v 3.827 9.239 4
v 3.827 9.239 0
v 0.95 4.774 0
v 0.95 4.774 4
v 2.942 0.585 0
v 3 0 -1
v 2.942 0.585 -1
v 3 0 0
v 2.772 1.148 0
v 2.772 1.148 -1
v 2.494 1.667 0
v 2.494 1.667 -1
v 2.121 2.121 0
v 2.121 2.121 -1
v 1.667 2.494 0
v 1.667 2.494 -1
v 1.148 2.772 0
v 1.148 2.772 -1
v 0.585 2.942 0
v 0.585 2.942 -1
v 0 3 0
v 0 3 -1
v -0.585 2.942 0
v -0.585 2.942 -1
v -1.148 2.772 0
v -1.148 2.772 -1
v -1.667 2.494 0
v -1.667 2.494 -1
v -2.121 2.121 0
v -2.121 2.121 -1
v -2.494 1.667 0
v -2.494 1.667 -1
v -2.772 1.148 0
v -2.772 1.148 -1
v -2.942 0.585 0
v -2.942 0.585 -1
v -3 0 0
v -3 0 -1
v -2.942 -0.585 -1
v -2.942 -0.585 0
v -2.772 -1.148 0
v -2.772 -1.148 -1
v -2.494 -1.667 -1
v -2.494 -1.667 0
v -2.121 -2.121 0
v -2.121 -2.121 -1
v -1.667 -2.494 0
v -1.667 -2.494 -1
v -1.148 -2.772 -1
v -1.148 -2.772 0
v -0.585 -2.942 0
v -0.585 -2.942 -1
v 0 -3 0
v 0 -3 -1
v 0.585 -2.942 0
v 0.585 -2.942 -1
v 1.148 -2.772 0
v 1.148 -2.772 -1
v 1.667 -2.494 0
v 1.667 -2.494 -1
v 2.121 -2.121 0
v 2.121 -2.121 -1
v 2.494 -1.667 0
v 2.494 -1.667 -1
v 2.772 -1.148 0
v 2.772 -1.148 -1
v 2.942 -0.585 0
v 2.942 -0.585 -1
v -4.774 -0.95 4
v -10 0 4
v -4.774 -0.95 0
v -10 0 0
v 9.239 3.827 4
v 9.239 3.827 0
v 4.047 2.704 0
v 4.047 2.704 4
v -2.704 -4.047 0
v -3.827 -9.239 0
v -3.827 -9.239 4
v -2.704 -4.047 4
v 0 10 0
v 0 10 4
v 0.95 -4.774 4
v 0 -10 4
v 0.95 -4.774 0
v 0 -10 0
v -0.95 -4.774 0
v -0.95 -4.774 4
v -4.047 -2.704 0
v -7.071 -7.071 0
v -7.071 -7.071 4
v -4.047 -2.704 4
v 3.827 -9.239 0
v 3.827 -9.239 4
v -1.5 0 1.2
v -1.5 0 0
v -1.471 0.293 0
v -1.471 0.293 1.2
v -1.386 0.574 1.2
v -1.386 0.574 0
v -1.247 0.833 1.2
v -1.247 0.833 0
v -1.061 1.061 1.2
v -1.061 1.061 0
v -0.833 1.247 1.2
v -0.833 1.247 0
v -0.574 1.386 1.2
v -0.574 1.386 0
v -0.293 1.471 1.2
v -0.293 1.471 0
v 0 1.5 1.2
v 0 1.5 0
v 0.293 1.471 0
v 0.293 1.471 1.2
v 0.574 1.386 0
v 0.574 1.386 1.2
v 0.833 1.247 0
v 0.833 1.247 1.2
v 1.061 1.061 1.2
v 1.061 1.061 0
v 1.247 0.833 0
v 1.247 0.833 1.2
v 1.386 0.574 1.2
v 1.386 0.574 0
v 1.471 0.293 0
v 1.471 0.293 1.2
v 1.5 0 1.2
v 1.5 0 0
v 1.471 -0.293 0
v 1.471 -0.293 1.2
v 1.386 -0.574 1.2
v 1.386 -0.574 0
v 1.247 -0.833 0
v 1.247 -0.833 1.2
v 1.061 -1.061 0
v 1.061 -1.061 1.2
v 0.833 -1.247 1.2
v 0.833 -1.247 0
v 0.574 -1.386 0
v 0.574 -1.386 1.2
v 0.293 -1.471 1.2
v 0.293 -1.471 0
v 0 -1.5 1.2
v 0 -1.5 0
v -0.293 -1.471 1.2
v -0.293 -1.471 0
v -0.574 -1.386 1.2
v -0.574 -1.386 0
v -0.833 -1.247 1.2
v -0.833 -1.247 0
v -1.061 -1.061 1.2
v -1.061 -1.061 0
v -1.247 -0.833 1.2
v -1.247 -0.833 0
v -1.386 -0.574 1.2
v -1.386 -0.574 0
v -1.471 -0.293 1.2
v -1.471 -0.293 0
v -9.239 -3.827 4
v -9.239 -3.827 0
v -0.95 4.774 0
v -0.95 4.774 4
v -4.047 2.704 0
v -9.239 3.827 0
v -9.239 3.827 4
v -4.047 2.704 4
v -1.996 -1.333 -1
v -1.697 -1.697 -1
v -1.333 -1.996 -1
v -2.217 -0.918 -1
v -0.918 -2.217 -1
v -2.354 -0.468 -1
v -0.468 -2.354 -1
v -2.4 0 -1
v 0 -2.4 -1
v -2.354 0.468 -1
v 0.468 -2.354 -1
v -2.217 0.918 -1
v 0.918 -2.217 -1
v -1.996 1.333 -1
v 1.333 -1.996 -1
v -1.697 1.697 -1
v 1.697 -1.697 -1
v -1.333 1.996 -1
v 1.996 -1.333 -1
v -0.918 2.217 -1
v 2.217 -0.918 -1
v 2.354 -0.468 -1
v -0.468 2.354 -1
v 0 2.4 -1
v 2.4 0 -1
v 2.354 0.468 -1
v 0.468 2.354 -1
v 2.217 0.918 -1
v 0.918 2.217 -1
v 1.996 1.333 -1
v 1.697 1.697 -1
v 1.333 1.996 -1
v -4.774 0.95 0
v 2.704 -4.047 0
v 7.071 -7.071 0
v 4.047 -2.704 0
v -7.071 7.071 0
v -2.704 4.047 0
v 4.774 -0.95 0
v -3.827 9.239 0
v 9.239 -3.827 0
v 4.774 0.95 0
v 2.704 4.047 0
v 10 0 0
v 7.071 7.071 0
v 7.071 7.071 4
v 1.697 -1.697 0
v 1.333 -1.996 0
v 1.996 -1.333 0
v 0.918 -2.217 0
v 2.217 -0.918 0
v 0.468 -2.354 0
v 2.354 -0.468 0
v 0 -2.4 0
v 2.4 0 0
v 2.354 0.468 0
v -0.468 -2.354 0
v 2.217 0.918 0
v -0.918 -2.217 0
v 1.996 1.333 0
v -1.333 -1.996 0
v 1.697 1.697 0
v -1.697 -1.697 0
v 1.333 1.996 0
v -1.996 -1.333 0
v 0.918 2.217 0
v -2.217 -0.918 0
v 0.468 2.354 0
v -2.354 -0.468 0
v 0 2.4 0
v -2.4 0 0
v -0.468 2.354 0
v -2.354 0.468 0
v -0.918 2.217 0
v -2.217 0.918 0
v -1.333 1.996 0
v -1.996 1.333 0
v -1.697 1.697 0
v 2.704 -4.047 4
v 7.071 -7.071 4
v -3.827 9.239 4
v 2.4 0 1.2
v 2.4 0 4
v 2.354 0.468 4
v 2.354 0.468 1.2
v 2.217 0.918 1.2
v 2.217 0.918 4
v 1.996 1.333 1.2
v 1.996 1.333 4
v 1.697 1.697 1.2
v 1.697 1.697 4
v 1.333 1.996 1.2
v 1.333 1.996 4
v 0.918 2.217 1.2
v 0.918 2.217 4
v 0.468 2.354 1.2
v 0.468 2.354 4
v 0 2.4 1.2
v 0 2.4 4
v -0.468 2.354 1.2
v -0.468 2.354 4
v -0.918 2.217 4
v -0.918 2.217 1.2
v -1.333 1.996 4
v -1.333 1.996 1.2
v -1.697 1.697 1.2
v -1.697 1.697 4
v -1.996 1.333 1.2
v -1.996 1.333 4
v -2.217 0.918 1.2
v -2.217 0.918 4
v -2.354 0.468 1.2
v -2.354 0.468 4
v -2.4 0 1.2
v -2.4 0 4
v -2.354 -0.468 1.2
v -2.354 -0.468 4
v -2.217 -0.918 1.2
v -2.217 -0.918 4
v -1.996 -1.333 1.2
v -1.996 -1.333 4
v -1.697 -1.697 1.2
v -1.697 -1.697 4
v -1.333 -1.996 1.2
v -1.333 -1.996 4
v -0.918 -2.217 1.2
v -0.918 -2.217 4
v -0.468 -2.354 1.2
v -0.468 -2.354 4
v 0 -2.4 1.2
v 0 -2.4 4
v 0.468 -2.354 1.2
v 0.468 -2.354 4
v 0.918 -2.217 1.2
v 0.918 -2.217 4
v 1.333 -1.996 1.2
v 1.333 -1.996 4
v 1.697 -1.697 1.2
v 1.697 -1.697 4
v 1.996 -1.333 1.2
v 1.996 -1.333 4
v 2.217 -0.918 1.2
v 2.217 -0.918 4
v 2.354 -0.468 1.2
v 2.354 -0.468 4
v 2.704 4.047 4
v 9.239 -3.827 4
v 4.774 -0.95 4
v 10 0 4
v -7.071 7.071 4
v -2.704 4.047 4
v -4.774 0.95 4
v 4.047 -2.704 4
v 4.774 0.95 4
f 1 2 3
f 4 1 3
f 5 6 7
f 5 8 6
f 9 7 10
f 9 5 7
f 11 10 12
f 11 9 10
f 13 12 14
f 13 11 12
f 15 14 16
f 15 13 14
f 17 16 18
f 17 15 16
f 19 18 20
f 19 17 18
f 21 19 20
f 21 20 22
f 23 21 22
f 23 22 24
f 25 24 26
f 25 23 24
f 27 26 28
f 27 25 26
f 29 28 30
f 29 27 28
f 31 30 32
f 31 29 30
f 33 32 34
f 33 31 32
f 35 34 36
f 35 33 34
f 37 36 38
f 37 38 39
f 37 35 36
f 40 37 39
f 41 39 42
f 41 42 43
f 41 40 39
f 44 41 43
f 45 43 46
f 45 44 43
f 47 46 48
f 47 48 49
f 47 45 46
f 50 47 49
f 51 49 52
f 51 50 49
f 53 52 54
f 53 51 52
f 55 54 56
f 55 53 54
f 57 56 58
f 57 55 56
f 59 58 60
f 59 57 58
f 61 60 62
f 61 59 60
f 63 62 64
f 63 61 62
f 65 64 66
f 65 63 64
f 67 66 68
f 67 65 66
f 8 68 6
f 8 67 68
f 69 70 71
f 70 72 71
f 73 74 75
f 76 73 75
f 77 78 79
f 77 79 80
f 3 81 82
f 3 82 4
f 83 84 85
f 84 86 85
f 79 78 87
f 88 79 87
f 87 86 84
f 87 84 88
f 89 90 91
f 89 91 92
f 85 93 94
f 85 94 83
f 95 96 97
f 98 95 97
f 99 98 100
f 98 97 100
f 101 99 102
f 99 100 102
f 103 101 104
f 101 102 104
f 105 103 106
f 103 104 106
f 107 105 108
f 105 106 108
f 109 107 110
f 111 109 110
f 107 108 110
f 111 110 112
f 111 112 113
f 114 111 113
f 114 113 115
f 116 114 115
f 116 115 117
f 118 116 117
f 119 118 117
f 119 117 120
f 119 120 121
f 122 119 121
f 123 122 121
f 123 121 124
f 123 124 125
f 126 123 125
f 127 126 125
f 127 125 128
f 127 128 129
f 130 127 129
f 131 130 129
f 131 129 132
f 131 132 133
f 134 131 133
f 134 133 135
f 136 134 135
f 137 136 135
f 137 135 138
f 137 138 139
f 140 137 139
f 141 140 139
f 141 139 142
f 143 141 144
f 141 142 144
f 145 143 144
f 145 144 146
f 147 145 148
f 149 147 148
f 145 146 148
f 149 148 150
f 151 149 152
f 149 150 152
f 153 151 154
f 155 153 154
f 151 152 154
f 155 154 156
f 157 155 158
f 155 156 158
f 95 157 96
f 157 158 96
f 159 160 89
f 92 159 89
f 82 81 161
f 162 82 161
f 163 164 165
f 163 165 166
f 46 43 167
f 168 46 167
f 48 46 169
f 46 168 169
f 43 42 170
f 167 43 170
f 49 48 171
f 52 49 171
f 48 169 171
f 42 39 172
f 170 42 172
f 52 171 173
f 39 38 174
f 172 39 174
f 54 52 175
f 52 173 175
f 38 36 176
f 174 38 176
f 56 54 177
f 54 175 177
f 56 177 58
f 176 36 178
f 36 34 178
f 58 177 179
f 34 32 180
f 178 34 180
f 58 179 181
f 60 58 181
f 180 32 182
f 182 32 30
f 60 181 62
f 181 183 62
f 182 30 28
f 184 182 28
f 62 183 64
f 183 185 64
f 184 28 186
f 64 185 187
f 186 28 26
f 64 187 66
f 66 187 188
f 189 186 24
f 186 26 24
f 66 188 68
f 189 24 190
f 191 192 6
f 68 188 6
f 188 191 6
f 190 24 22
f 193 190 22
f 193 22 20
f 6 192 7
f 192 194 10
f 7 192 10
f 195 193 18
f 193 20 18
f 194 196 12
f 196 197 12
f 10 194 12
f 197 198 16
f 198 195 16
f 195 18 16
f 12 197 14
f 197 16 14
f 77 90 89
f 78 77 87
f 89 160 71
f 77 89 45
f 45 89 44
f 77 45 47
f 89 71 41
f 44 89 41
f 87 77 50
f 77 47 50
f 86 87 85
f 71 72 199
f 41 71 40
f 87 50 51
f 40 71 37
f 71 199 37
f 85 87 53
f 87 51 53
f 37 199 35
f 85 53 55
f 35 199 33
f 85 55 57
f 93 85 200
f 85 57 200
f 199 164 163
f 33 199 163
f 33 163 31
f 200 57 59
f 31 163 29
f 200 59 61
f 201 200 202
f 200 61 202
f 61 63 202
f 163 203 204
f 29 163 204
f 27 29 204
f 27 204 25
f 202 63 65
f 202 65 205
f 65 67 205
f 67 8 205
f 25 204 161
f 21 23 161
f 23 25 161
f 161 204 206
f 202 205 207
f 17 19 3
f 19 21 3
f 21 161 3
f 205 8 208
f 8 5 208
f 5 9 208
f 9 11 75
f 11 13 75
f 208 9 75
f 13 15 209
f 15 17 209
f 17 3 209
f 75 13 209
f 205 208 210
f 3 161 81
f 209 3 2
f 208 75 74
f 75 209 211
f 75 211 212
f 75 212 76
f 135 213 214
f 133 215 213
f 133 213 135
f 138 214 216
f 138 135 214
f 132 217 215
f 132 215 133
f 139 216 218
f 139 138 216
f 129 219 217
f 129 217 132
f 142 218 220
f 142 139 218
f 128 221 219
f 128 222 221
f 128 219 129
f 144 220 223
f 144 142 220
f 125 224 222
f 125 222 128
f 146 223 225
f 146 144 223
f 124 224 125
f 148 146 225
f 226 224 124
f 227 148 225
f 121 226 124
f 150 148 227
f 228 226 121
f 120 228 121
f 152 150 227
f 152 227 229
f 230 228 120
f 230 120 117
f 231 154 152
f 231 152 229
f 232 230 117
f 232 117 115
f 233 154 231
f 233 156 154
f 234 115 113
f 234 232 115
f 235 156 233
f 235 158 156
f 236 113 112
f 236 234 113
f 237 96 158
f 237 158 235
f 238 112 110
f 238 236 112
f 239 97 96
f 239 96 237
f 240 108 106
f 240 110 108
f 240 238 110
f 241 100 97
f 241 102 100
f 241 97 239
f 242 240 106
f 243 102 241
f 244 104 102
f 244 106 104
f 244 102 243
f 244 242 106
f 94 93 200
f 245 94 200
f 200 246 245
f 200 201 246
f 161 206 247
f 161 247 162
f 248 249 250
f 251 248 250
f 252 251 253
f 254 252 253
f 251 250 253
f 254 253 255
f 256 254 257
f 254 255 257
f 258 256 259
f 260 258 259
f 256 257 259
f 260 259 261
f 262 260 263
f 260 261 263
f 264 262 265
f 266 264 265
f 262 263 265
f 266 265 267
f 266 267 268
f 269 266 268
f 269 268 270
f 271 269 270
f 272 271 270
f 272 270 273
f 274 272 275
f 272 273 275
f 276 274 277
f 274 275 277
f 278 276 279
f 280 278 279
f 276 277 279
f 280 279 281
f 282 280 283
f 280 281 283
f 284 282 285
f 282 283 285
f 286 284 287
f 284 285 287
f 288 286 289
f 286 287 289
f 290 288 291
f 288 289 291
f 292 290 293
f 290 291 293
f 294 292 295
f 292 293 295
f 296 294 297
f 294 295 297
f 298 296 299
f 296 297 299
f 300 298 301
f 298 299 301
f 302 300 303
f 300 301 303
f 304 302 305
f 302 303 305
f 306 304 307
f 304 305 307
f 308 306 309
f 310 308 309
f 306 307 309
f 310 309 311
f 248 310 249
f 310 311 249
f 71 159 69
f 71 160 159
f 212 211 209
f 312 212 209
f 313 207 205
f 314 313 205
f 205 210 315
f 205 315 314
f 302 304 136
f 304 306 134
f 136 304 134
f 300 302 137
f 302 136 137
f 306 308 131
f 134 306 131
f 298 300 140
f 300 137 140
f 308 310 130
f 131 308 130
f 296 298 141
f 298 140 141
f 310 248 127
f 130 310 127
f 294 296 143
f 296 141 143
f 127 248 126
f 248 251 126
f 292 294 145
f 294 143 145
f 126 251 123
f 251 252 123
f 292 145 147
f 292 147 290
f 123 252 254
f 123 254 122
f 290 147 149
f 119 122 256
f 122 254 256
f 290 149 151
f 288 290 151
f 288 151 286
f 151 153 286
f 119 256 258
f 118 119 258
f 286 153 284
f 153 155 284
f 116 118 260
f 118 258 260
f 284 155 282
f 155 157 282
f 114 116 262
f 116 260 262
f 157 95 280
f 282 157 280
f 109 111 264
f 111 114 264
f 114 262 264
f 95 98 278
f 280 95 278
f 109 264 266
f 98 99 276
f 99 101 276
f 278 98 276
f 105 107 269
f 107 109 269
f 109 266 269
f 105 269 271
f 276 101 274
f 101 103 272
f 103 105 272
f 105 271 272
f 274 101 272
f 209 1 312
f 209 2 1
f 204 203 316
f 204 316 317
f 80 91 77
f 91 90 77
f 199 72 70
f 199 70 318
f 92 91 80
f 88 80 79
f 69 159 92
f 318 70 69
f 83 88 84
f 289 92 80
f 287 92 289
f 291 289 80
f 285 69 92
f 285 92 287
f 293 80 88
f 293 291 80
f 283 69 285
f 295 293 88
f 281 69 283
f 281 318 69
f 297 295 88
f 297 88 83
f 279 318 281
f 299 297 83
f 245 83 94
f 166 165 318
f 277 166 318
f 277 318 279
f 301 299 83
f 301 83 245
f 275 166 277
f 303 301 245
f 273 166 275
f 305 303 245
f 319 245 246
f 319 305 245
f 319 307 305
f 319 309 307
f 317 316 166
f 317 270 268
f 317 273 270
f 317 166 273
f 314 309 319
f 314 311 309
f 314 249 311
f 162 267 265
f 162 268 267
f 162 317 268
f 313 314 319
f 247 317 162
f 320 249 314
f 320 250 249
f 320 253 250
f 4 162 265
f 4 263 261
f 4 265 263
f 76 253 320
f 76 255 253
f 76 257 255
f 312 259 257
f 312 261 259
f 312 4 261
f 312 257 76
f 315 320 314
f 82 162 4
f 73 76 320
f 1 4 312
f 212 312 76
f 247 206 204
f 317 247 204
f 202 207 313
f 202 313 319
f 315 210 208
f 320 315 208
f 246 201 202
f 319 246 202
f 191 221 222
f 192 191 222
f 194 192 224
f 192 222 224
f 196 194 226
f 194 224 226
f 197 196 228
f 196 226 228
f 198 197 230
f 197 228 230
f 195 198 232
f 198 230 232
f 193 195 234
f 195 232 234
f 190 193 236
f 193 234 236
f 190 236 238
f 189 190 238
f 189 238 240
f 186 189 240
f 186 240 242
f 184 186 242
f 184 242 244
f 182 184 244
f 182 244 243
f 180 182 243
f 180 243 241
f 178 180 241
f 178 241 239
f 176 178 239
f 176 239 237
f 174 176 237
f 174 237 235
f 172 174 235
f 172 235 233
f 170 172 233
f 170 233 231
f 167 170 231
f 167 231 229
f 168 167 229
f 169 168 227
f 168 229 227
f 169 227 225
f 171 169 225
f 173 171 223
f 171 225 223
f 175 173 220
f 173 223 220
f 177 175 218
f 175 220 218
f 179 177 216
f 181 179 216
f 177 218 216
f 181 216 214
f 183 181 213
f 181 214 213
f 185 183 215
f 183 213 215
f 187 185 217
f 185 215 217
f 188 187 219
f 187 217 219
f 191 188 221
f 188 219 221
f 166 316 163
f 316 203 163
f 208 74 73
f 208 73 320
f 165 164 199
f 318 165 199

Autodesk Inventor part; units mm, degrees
ref_plane "YZ Plane" through (0, 0, 0) normal (1, 0, 0) x (0, 1, 0)
ref_plane "XZ Plane" through (0, 0, 0) normal (0, 1, 0) x (-1, 0, 0)
ref_plane "XY Plane" through (0, 0, 0) normal (0, 0, 1) x (1, 0, 0)
sketch "Szkic1" plane through (0, 0, 0) normal (0, 0, 1) x (1, 0, 0)
  circle A0 centre (0, 0) radius 2.25
  circle A1 centre (0, 0) radius 3
  dimension "d0" = 4.5
  dimension "d1" = 6
extrude "Wyciągnięcie proste1" add sketch "Szkic1" against normal blind 1
sketch "Szkic4" plane through (0, 0, 0) normal (0, 0, 1) x (1, 0, 0)
  circle A0 centre (0, 0) radius 2.25 projected
  circle A1 centre (0, 0) radius 3 projected
  circle A2 centre (0, 0) radius 3
  circle A3 centre (0, 0) radius 2.25
  circle A4 centre (0, 0) radius 3.65
  line L0 (0, 0) -> (0, 8.5)
  circle A5 centre (0, 0) radius 2.4
  line L1 (0, 8.5) -> (0, 9.5)
  line L2 (0, 8.5) -> (5.1877, 8.5) construction
  line L3 (0, 9.5) -> (0, 10)
  line L4 (0, 10) -> (1.1899, 3.4506)
  line L5 (0, 10) -> (-1.1899, 3.4506)
  line L6 (-3.8268, 9.2388) -> (-0.2212, 3.6433)
  line L7 (-3.8268, 9.2388) -> (-2.4198, 2.7326)
  line L8 (-7.0711, 7.0711) -> (-1.5985, 3.2813)
  line L9 (-7.0711, 7.0711) -> (-3.2813, 1.5985)
  line L10 (-9.2388, 3.8268) -> (-2.7326, 2.4198)
  line L11 (-9.2388, 3.8268) -> (-3.6433, 0.2212)
  line L12 (-10, 0) -> (-3.4506, 1.1899)
  line L13 (-10, 0) -> (-3.4506, -1.1899)
  line L14 (-9.2388, -3.8268) -> (-3.6433, -0.2212)
  line L15 (-9.2388, -3.8268) -> (-2.7326, -2.4198)
  line L16 (-7.0711, -7.0711) -> (-3.2813, -1.5985)
  line L17 (-7.0711, -7.0711) -> (-1.5985, -3.2813)
  line L18 (-3.8268, -9.2388) -> (-2.4198, -2.7326)
  line L19 (-3.8268, -9.2388) -> (-0.2212, -3.6433)
  line L20 (0, -10) -> (-1.1899, -3.4506)
  line L21 (0, -10) -> (1.1899, -3.4506)
  line L22 (3.8268, -9.2388) -> (0.2212, -3.6433)
  line L23 (3.8268, -9.2388) -> (2.4198, -2.7326)
  line L24 (7.0711, -7.0711) -> (1.5985, -3.2813)
  line L25 (7.0711, -7.0711) -> (3.2813, -1.5985)
  line L26 (9.2388, -3.8268) -> (2.7326, -2.4198)
  line L27 (9.2388, -3.8268) -> (3.6433, -0.2212)
  line L28 (10, 0) -> (3.4506, -1.1899)
  line L29 (10, 0) -> (3.4506, 1.1899)
  line L30 (9.2388, 3.8268) -> (3.6433, 0.2212)
  line L31 (9.2388, 3.8268) -> (2.7326, 2.4198)
  line L32 (7.0711, 7.0711) -> (3.2813, 1.5985)
  line L33 (7.0711, 7.0711) -> (1.5985, 3.2813)
  line L34 (3.8268, 9.2388) -> (2.4198, 2.7326)
  line L35 (3.8268, 9.2388) -> (0.2212, 3.6433)
  point P0 (-0.9495, 4.7736)
  point P1 (-2.704, 4.0469)
  point P2 (-4.0469, 2.704)
  point P3 (-4.7736, 0.9495)
  point P4 (-4.7736, -0.9495)
  point P5 (-4.0469, -2.704)
  point P6 (-2.704, -4.0469)
  point P7 (-0.9495, -4.7736)
  point P8 (0.9495, -4.7736)
  point P9 (2.704, -4.0469)
  point P10 (4.0469, -2.704)
  point P11 (4.7736, -0.9495)
  point P12 (4.7736, 0.9495)
  point P13 (4.0469, 2.704)
  point P14 (2.704, 4.0469)
  point P15 (0.9495, 4.7736)
  dimension "d29" = 7.3
  dimension "d44" = 8.5
  dimension "d50" = 4.8
  dimension "d51" = 1
  dimension "d76" = 0.5
  dimension "d79" = 360
extrude "Wyciągnięcie proste4" add sketch "Szkic4" along normal blind 4 contours A5 | A1 | A4 | A4 L6 L5 L3 L1 L0 | L0 L1 L3 L4 L35 A4 | L35 L4 A4 | A4 L5 L6 | L4 L35 L34 L33 A4 | A4 L8 L7 L6 L5 | L33 L34 A4 | A4 L7 L8 | L34 L33 L32 L31 A4 | A4 L10 L9 L8 L7 | L31 L32 A4 | A4 L9 L10 | L32 L31 L30 L29 A4 | A4 L12 L11 L10 L9 | L29 L30 A4 | A4 L11 L12 | L30 L29 L28 L27 A4 | A4 L14 L13 L12 L11 | A4 L13 L14 | L27 L28 A4 | L27 L26 L25 A4 L28 | A4 L16 L15 L14 L13 | A4 L15 L16 | L25 L26 A4 | L25 L24 L23 A4 L26 | A4 L18 L17 L16 L15 | A4 L17 L18 | L23 L24 A4 | L23 L22 L21 A4 L24 | A4 L20 L19 L18 L17 | A4 L19 L20 | L21 L22 A4 | L21 L20 L19 A4 L22
sketch "Szkic5" plane through (0, 0, 4) normal (0, 0, 1) x (1, 0, 0)
  circle A0 centre (0, 0) radius 2.35
  dimension "d41" = 4.7
extrude "Wyciągnięcie proste5" cut sketch "Szkic5" against normal through all
sketch "Szkic6" plane through (0, 0, 4) normal (0, 0, 1) x (1, 0, 0)
  circle A0 centre (0, 0) radius 2.4
  dimension "d57" = 4.8
extrude "Wyciągnięcie proste6" cut sketch "Szkic6" against normal through all
ref_plane "Płaszczyzna konstrukcyjna1" through (0, 0, 0) normal (0, 0, -1) x (-1, 0, 0)
sketch "Szkic7" plane through (0, 0, 0) normal (0, 0, -1) x (-1, 0, 0)
  circle A0 centre (0, 0) radius 2.4
  circle A1 centre (0, 0) radius 1.5
  dimension "d61" = 3
extrude "Wyciągnięcie proste7" add sketch "Szkic7" against normal blind 1.2
properties part number "GEAR_SERV"
